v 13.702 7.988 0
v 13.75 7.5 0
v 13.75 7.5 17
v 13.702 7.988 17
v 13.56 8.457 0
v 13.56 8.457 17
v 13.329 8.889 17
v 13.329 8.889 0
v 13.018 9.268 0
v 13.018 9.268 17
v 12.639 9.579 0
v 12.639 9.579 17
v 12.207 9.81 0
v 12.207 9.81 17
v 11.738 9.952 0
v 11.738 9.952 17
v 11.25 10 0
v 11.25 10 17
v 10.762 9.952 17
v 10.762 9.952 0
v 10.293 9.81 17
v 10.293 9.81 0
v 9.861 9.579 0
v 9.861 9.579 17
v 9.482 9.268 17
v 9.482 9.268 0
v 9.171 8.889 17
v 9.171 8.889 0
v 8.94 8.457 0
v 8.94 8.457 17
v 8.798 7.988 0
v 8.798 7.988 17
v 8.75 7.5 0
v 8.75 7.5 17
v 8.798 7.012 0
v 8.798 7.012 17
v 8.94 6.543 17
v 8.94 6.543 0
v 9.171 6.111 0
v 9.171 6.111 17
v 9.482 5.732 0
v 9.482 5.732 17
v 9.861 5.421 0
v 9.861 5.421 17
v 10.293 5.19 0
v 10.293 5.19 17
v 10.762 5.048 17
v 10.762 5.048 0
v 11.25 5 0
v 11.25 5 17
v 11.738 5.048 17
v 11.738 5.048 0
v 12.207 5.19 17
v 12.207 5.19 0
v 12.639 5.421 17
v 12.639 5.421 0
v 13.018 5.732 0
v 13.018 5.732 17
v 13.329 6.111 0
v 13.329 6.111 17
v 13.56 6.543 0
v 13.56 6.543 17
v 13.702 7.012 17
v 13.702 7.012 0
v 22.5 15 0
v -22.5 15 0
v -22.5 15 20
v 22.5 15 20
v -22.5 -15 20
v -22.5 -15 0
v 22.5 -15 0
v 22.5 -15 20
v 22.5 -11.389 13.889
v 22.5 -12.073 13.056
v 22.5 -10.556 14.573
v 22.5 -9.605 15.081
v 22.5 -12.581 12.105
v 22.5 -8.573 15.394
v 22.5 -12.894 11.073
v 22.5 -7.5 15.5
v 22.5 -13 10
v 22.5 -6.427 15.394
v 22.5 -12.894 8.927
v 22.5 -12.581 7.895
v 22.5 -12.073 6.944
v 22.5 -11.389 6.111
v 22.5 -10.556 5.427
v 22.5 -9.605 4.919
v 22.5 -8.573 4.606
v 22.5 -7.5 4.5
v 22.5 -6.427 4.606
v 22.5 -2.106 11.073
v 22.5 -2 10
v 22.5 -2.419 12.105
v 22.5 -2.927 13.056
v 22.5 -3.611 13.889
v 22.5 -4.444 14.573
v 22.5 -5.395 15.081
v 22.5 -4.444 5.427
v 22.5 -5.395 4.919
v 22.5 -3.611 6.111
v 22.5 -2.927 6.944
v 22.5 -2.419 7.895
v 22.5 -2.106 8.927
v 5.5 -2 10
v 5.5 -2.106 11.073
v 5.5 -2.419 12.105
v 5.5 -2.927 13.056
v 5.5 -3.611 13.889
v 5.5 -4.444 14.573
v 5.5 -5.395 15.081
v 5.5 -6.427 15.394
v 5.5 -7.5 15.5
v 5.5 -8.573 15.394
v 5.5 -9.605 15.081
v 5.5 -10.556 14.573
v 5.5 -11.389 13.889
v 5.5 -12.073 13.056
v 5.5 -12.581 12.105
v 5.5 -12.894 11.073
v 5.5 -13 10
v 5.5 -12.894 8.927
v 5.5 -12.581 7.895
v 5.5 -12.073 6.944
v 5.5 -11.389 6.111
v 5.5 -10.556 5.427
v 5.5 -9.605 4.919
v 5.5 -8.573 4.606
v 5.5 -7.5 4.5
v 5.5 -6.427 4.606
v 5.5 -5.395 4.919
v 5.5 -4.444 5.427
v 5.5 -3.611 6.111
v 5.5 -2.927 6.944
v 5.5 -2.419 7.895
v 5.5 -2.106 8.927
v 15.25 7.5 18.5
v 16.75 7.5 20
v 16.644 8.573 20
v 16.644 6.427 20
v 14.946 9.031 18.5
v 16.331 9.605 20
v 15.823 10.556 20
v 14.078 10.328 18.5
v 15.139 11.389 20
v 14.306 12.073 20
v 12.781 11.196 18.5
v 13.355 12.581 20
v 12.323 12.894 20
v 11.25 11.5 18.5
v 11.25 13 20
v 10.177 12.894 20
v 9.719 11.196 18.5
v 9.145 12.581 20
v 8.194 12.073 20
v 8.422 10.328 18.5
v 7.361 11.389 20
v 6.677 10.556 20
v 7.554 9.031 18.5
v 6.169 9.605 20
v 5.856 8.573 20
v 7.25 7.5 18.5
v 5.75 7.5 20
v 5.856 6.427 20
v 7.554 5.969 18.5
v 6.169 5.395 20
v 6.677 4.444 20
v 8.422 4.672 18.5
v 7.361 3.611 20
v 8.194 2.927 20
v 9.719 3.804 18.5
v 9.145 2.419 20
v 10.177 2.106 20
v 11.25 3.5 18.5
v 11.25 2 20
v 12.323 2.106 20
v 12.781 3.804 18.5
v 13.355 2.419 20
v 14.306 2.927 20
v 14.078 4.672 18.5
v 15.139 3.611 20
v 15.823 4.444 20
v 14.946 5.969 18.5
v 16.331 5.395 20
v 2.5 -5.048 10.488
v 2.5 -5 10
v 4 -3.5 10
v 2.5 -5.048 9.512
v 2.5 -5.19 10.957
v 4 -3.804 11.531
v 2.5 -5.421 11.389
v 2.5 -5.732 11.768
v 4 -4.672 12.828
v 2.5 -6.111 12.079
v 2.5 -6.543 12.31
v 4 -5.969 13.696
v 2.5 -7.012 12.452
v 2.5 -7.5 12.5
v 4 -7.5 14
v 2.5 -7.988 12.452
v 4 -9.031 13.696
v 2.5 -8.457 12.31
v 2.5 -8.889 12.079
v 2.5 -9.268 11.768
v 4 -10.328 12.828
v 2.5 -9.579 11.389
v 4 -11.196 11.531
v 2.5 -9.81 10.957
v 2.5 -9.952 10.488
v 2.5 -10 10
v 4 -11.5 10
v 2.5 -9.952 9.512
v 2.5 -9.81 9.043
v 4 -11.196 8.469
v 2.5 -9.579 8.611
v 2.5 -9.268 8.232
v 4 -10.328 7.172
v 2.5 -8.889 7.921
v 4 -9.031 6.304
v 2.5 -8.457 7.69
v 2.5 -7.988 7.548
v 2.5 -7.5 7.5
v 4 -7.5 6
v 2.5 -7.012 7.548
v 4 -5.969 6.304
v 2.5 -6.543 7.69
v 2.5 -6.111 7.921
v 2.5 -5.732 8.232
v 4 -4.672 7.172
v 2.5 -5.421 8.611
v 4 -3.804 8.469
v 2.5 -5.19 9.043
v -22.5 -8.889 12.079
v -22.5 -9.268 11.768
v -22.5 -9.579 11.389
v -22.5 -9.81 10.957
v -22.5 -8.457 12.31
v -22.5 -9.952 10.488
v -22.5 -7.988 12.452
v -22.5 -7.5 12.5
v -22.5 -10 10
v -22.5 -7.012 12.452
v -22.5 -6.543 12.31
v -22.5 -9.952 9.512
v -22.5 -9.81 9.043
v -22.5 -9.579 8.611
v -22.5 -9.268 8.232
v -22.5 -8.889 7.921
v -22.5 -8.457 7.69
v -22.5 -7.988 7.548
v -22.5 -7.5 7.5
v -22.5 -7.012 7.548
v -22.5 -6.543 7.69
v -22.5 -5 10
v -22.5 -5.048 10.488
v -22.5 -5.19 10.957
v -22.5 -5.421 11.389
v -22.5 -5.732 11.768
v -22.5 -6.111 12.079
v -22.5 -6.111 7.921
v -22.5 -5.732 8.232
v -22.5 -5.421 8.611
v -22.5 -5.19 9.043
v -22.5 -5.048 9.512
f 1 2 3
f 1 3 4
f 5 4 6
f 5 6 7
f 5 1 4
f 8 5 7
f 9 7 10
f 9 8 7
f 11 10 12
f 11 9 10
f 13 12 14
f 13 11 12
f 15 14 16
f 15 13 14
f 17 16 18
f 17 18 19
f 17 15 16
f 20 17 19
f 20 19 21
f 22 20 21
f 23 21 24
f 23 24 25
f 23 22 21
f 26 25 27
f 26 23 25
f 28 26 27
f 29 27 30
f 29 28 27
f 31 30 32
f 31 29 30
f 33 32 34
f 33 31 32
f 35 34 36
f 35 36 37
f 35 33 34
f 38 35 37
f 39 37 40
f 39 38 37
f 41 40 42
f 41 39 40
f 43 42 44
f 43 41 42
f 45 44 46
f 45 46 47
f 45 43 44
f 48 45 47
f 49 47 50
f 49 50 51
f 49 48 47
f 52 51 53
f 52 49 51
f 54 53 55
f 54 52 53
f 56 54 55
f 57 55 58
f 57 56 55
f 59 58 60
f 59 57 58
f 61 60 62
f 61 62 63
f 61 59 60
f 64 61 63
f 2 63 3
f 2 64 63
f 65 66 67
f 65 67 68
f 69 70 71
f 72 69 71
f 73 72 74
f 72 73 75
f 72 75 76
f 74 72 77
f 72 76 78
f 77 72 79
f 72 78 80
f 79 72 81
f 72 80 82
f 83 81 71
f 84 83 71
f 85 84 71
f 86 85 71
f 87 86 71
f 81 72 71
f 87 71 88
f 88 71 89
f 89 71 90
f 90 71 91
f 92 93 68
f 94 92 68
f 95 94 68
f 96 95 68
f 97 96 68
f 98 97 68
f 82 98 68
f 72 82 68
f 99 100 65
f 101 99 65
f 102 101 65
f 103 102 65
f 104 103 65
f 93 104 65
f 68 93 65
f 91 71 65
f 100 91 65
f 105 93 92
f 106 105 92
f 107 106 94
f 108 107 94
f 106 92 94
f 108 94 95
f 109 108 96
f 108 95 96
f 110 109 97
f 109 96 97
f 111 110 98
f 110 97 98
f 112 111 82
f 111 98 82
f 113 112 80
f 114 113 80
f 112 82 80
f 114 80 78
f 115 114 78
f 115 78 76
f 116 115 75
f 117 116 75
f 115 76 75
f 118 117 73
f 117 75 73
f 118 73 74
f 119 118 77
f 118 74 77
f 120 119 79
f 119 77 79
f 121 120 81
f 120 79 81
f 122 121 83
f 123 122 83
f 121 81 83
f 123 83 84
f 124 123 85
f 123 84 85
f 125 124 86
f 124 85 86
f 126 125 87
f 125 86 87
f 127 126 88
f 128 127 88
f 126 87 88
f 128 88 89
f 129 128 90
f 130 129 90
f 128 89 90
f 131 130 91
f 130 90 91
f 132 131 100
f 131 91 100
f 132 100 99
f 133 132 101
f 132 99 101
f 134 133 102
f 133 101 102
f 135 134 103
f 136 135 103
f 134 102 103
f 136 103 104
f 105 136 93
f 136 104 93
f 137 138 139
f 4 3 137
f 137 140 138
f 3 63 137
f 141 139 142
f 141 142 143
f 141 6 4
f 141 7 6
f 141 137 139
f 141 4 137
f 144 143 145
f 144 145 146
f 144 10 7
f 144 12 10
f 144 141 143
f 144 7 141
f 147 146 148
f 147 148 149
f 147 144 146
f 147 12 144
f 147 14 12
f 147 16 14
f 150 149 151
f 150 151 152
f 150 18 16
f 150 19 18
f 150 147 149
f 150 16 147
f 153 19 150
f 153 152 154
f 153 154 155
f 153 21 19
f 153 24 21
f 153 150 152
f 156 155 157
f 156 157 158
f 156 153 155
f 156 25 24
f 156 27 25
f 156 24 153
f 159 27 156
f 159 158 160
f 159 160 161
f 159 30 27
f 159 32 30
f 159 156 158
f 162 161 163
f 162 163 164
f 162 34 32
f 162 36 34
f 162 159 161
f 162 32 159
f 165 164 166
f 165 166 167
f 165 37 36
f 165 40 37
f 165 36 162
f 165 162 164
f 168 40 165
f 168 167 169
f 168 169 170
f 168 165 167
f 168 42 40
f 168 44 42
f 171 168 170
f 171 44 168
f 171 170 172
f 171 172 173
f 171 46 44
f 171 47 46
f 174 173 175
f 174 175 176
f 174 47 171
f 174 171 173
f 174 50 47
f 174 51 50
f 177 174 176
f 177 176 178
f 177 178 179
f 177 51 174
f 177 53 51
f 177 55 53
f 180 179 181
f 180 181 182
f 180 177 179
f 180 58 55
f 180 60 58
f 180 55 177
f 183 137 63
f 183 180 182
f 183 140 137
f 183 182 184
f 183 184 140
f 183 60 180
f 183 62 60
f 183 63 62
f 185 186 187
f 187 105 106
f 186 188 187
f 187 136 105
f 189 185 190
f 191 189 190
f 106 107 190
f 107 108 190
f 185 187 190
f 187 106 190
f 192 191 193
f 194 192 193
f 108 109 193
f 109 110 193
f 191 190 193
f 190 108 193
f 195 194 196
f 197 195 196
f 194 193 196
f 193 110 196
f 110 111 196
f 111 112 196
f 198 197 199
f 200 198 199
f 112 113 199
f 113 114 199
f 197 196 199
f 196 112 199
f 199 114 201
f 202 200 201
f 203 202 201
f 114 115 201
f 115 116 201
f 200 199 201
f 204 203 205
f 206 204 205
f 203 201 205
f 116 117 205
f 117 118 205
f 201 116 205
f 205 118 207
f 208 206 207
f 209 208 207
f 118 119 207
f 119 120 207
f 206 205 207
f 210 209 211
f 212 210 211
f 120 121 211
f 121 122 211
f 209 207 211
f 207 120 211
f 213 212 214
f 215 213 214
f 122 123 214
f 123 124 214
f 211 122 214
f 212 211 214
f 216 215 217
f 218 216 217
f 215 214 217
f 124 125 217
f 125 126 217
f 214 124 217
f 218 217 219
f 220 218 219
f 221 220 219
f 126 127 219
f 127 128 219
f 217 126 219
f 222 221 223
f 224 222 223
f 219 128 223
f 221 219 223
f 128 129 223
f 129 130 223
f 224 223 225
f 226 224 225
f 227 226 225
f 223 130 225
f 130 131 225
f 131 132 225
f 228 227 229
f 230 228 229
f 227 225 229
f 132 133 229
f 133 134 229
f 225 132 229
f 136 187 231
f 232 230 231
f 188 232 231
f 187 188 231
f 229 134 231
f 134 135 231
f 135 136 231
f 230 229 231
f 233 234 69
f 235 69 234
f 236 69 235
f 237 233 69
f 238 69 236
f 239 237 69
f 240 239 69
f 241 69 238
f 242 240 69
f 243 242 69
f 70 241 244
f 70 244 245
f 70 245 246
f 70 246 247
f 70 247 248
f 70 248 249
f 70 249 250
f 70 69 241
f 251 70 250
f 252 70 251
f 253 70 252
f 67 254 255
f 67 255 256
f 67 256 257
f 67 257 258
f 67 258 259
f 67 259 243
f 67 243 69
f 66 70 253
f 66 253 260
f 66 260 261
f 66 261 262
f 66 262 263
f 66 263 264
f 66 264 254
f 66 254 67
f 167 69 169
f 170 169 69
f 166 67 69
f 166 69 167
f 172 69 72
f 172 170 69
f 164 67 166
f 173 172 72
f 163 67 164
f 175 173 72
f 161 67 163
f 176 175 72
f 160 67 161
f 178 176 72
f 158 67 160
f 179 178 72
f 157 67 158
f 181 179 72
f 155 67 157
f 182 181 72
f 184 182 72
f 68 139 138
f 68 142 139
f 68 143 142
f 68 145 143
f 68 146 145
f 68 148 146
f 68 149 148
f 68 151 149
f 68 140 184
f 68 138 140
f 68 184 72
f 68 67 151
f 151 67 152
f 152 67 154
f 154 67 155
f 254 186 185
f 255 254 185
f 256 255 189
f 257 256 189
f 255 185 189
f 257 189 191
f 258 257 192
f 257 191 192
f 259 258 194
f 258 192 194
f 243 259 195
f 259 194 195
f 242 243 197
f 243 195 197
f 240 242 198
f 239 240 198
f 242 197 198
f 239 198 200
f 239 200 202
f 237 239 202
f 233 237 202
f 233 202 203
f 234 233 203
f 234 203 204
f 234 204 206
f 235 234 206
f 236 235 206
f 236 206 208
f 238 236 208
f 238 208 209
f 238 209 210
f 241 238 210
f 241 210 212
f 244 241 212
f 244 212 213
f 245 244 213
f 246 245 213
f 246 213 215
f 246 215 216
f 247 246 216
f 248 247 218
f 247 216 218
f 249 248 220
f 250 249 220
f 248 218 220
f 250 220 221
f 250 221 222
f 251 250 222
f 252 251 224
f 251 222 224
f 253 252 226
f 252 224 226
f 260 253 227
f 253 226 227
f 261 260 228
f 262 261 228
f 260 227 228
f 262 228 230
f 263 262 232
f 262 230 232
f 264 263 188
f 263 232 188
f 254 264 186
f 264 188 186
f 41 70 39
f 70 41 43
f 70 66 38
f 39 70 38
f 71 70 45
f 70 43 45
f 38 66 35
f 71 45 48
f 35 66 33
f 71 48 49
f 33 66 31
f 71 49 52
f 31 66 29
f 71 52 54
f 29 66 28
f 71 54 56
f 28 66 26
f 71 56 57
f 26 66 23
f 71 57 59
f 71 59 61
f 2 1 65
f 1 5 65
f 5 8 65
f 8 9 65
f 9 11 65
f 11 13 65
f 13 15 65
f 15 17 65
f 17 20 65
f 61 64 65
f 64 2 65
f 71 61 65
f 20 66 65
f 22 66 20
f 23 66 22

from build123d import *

# Parameters (mm, degrees)
F0_W     = 45
F0_H     = 30
F0_R     = 2.5
F1_DEPTH = 20
F2_R     = 2.5
F3_DEPTH = 45.001
F2_R_2   = 5.5
F4_DEPTH = 20
F5_SIZE  = 2.99999


# Not quite as in the source:
# - a fillet or chamfer is up to 0.001 mm smaller than in the source, because OpenCascade refuses the exact size


with BuildPart() as f1:
    # F0 (on Top) → F1 (new body)
    with BuildSketch(Plane.XY):
        Rectangle(F0_W, F0_H)
        with Locations((11.25, 7.5)):
            Circle(F0_R, mode=Mode.SUBTRACT)
    extrude(amount=F1_DEPTH)

    # F2 (on face) → F3 (cut, through all)
    with BuildSketch(Plane.YZ.offset(22.5)):
        with Locations((-7.5, 10)):
            Circle(F2_R)
    extrude(amount=-F3_DEPTH, mode=Mode.SUBTRACT)

    # F2 (on face) → F4 (cut)
    with BuildSketch(Plane.YZ.offset(22.5)):
        with Locations((-7.5, 10)):
            Circle(F2_R_2)
        with Locations((-7.5, 10)):
            Circle(F2_R, mode=Mode.SUBTRACT)
    extrude(amount=-F4_DEPTH, mode=Mode.SUBTRACT)

    # F5 (size 3 in the source; OpenCascade refuses exactly that, so slightly less here)
    f5_edges = [f1.edges().sort_by_distance(p)[0] for p in [
        (8.75, 7.5, 20),
        (2.5, -13, 10),
    ]]
    chamfer(f5_edges, length=F5_SIZE)


solid = f1.part
